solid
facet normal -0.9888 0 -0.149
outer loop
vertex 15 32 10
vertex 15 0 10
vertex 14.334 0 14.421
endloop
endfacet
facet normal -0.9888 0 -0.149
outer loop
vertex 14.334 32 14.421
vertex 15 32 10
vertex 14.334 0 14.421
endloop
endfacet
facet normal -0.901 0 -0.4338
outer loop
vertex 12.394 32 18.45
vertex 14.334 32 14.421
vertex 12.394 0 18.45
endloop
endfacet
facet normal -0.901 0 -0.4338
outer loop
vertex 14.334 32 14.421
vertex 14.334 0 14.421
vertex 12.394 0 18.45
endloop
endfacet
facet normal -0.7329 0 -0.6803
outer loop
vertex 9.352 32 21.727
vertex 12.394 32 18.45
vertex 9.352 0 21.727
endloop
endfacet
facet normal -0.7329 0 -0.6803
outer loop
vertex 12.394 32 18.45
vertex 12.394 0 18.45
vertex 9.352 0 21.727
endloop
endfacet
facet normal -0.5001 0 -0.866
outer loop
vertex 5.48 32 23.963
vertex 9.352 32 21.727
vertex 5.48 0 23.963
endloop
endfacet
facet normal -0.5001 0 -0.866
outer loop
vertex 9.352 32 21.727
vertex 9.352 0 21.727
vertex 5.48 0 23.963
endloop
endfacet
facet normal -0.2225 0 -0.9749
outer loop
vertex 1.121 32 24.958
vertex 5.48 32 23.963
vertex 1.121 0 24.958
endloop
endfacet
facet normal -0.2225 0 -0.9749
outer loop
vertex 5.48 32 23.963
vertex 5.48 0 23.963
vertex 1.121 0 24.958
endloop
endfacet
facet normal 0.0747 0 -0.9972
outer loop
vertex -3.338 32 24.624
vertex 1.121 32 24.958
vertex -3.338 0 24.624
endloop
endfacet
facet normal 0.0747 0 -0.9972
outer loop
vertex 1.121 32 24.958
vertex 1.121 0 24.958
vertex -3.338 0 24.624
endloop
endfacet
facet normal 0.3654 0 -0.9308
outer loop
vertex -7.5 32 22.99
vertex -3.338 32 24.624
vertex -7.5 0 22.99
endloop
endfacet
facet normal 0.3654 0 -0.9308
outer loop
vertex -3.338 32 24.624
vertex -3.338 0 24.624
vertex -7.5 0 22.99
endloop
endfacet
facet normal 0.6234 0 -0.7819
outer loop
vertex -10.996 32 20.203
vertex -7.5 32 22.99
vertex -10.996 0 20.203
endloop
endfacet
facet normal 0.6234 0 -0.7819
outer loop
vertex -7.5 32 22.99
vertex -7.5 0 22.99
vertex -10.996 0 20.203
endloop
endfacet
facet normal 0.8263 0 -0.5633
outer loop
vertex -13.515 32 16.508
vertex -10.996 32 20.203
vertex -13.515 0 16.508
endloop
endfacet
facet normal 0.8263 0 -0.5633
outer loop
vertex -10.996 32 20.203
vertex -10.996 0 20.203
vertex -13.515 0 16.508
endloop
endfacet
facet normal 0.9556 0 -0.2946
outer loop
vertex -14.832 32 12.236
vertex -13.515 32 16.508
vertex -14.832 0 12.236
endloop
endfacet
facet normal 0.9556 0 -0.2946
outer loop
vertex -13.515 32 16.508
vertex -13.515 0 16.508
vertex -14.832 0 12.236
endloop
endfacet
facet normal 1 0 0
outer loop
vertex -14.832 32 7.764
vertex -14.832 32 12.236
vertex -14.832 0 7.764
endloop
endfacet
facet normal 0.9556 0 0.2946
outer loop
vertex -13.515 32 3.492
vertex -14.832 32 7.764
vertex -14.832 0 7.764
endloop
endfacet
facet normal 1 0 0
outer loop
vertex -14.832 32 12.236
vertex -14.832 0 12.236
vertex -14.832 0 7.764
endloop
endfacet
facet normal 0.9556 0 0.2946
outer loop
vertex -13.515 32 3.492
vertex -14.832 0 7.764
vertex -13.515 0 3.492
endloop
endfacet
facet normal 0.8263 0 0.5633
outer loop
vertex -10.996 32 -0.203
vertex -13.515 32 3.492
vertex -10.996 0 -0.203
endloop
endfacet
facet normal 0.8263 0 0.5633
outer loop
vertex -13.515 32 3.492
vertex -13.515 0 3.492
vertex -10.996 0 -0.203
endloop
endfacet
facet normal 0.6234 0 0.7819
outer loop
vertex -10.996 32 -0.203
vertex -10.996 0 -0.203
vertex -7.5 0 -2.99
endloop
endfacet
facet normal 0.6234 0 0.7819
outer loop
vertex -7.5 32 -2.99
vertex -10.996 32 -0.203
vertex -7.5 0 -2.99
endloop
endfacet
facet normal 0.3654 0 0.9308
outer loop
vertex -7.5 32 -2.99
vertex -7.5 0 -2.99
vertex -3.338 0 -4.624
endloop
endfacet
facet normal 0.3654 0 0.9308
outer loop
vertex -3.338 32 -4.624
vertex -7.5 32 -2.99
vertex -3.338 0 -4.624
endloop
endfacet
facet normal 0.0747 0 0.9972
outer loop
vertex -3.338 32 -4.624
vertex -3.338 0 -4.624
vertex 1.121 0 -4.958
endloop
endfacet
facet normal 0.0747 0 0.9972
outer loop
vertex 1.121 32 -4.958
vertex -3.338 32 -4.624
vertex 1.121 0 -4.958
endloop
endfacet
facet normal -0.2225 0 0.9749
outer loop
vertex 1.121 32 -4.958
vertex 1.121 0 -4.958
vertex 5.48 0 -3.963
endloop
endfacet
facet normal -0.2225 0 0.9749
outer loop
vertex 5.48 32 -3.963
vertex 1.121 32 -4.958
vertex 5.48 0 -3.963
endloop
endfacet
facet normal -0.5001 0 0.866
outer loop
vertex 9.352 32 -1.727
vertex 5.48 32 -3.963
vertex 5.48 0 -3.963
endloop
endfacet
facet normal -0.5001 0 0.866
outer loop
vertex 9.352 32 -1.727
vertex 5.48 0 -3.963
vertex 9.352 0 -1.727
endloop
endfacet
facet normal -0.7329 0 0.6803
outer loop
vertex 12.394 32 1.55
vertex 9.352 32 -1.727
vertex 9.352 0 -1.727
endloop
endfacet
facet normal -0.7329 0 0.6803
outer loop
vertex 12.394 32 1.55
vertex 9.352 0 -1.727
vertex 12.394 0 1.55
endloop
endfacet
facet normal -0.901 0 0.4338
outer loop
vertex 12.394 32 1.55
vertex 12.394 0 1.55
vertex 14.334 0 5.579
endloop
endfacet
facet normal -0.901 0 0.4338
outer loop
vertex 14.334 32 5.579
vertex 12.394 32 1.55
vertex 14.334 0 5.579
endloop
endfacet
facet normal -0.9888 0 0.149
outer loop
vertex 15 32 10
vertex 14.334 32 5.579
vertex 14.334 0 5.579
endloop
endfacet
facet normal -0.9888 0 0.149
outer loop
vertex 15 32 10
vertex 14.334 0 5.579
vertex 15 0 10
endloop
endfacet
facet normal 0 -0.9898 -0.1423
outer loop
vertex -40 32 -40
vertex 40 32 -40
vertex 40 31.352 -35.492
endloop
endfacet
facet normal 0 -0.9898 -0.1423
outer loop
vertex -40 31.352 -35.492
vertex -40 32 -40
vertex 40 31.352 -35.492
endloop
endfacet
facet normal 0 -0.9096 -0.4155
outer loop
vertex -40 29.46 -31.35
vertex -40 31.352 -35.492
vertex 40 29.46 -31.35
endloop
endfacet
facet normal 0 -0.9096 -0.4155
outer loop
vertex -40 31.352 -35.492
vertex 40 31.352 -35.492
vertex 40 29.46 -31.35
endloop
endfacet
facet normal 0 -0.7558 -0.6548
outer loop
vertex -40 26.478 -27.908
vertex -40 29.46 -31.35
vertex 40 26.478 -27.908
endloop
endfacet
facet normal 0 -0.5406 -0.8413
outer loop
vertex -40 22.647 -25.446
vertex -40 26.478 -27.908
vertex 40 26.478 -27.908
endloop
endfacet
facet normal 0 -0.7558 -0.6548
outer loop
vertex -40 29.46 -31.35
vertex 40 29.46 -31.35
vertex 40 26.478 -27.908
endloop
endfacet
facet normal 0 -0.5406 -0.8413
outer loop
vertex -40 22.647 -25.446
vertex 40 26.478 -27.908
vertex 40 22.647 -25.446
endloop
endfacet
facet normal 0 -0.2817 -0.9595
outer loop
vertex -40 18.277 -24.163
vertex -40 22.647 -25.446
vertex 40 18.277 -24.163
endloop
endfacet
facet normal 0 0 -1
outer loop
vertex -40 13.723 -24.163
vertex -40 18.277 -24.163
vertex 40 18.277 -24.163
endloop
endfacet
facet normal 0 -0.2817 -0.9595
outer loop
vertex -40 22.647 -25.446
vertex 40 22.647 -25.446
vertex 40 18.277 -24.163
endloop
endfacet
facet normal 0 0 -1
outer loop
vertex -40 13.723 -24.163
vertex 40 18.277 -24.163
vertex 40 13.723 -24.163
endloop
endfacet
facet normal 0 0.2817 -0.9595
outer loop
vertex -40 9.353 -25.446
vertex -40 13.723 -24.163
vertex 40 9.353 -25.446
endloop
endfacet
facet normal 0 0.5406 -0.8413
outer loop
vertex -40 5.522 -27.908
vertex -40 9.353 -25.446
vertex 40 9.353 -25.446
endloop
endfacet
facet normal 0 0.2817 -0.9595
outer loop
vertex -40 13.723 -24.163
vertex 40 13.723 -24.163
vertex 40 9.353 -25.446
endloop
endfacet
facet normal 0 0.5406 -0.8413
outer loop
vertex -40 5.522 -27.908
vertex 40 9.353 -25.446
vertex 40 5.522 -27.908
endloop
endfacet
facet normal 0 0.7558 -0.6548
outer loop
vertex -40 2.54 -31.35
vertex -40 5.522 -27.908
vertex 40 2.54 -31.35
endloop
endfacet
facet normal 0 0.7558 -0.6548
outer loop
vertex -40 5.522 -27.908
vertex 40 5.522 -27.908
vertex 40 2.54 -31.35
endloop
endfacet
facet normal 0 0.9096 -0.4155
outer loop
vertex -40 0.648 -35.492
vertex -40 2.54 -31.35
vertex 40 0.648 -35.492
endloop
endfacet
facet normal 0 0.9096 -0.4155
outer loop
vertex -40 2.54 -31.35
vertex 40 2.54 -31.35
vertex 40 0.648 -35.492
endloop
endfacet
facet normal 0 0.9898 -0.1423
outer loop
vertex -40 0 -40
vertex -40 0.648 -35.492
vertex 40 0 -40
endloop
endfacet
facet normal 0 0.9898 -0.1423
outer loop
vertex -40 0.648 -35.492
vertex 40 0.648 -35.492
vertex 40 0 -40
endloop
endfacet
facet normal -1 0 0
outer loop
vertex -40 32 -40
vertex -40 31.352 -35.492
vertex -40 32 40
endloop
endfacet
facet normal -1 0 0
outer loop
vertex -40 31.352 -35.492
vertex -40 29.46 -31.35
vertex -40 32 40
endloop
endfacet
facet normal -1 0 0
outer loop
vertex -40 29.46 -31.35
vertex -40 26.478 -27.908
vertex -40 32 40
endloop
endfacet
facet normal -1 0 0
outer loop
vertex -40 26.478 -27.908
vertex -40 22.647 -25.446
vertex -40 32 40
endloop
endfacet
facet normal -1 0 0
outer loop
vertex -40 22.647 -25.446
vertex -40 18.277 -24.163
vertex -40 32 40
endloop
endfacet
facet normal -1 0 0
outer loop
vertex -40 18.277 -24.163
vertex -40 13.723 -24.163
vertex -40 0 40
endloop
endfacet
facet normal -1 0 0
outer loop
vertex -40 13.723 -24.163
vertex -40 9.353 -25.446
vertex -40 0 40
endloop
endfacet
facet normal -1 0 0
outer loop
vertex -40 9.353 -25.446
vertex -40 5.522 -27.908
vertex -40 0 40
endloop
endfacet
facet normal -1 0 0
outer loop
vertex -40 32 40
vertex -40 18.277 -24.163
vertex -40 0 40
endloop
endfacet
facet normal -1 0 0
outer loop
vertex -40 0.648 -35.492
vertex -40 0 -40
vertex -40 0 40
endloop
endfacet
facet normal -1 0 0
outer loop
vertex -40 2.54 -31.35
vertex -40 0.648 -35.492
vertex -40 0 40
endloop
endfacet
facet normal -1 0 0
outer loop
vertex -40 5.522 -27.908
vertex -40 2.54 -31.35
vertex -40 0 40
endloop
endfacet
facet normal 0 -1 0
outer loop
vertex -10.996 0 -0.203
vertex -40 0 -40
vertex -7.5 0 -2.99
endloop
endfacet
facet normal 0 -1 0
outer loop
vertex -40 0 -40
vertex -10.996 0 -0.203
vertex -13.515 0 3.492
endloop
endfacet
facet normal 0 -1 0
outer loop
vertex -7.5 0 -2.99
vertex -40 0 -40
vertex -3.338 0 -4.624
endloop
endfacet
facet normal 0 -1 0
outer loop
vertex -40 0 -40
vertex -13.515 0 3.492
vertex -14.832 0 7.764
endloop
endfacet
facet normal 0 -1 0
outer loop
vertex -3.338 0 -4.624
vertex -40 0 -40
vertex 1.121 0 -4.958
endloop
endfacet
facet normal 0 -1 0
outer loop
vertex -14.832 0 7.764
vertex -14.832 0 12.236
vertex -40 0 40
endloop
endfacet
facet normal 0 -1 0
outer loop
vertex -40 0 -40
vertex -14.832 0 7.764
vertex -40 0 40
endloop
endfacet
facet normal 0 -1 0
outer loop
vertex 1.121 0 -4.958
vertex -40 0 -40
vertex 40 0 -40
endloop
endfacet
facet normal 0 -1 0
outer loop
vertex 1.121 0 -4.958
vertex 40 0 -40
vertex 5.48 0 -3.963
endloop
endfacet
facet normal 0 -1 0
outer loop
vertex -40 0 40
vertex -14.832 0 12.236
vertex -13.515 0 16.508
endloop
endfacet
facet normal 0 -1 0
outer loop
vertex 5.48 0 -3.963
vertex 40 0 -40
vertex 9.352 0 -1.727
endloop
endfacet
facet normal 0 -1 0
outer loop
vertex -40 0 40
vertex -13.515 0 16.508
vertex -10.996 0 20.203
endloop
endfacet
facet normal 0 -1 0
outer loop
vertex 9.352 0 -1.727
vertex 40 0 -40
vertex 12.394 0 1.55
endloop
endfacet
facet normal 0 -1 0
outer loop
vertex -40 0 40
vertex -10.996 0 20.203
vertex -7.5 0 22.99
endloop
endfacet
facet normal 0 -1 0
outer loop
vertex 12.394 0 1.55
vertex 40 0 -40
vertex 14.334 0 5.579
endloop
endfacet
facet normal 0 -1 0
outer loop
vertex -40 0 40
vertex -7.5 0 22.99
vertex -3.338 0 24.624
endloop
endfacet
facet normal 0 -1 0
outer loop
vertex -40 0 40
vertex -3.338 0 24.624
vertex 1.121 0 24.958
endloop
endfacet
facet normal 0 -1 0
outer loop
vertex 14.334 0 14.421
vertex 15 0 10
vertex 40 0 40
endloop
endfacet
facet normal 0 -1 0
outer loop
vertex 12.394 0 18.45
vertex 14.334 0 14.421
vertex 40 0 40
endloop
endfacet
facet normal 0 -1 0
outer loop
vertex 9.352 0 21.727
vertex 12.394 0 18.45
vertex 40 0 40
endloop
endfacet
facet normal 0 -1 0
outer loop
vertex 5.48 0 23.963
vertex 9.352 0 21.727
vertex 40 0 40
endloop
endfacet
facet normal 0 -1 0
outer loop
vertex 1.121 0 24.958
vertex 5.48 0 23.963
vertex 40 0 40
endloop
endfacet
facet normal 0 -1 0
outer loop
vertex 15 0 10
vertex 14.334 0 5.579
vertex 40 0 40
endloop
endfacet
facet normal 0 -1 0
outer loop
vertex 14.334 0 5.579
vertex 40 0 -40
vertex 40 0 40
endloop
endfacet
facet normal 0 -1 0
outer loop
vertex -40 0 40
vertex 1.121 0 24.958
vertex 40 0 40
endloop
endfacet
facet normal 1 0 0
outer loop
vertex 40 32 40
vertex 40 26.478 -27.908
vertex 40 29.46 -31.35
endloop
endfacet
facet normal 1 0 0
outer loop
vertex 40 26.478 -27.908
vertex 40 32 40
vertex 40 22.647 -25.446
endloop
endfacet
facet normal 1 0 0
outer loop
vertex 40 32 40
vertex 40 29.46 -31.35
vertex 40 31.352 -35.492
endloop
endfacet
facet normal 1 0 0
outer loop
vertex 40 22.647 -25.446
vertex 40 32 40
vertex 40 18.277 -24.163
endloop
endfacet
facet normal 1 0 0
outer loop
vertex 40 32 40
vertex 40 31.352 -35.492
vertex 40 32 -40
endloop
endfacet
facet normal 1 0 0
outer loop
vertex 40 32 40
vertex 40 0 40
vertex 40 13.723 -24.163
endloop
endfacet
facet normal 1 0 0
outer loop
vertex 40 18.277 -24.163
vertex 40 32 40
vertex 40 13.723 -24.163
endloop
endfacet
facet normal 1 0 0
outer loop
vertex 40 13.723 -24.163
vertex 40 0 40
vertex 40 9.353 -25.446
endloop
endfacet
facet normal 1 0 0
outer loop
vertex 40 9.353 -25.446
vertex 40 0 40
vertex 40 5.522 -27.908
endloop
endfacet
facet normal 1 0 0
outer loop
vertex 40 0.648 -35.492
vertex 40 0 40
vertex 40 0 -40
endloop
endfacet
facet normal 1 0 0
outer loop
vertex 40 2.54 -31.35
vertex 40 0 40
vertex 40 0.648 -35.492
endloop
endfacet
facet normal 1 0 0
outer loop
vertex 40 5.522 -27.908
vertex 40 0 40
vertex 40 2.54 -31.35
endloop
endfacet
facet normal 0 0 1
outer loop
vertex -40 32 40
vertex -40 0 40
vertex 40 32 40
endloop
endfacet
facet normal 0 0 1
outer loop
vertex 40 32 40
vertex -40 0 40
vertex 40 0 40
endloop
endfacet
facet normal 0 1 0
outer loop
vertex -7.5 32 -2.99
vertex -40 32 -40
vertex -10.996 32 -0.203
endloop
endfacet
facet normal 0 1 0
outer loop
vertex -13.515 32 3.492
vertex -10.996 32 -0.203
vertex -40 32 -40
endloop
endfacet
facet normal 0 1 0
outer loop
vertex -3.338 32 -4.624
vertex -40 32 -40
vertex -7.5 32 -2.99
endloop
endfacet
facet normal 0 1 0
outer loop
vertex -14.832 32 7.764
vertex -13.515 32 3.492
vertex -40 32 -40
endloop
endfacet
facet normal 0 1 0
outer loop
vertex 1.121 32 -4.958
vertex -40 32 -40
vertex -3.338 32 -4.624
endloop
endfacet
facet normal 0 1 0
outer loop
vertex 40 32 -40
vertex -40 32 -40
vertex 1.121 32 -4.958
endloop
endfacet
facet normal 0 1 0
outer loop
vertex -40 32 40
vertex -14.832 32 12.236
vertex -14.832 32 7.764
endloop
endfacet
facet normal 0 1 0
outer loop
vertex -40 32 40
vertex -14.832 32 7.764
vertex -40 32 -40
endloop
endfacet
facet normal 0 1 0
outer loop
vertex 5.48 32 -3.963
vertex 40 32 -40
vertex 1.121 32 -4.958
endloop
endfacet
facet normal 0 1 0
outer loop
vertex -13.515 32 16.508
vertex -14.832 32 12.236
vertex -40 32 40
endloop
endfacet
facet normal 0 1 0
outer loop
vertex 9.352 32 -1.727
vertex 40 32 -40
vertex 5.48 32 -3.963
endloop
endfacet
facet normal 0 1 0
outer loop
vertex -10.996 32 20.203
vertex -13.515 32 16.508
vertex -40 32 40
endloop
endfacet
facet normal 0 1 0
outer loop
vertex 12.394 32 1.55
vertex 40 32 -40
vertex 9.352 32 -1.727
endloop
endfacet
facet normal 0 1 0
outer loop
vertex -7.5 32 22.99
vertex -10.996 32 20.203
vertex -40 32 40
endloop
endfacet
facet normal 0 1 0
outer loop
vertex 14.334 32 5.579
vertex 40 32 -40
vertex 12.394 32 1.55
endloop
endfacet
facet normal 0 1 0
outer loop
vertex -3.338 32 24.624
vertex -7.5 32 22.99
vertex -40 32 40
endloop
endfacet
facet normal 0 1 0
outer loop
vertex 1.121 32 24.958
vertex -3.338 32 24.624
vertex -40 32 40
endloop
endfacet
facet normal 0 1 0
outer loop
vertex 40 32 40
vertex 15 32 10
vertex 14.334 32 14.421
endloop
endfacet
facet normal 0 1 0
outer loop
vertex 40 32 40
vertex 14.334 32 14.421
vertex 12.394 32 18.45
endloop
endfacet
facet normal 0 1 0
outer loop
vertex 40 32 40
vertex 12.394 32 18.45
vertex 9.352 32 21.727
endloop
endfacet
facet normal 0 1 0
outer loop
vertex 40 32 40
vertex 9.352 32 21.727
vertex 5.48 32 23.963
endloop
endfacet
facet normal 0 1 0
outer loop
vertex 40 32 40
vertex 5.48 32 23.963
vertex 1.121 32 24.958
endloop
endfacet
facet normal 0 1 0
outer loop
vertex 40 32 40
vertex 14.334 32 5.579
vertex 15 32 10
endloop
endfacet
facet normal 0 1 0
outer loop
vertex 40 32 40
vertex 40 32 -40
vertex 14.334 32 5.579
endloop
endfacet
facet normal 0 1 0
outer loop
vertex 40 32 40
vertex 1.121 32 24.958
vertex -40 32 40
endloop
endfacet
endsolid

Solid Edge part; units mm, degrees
sketch "Sketch1" plane through (0, 0, 0) normal (0, -1, 0) x (1, 0, 0)
  line L0 (-40, 40) -> (40, 40)
  line L1 (40, 40) -> (40, -40)
  line L2 (40, -40) -> (-40, -40)
  line L3 (-40, -40) -> (-40, 40)
  dimension "D1" = 80
  dimension "D2" = 80
extrude "Protrusion1" add sketch "Sketch1" against normal blind 32
sketch "Sketch2" plane through (40, 16, 0) normal (1, 0, 0) x (0, 1, 0)
  circle A0 centre (0, -40) radius 16
extrude "Cutout1" cut sketch "Sketch2" against normal through all
sketch "Sketch3" plane through (0, 0, 0) normal (0, -1, 0) x (1, 0, 0)
  circle A0 centre (0, 10) radius 15
  dimension "D1" = 50
extrude "Cutout2" cut sketch "Sketch3" against normal through all
